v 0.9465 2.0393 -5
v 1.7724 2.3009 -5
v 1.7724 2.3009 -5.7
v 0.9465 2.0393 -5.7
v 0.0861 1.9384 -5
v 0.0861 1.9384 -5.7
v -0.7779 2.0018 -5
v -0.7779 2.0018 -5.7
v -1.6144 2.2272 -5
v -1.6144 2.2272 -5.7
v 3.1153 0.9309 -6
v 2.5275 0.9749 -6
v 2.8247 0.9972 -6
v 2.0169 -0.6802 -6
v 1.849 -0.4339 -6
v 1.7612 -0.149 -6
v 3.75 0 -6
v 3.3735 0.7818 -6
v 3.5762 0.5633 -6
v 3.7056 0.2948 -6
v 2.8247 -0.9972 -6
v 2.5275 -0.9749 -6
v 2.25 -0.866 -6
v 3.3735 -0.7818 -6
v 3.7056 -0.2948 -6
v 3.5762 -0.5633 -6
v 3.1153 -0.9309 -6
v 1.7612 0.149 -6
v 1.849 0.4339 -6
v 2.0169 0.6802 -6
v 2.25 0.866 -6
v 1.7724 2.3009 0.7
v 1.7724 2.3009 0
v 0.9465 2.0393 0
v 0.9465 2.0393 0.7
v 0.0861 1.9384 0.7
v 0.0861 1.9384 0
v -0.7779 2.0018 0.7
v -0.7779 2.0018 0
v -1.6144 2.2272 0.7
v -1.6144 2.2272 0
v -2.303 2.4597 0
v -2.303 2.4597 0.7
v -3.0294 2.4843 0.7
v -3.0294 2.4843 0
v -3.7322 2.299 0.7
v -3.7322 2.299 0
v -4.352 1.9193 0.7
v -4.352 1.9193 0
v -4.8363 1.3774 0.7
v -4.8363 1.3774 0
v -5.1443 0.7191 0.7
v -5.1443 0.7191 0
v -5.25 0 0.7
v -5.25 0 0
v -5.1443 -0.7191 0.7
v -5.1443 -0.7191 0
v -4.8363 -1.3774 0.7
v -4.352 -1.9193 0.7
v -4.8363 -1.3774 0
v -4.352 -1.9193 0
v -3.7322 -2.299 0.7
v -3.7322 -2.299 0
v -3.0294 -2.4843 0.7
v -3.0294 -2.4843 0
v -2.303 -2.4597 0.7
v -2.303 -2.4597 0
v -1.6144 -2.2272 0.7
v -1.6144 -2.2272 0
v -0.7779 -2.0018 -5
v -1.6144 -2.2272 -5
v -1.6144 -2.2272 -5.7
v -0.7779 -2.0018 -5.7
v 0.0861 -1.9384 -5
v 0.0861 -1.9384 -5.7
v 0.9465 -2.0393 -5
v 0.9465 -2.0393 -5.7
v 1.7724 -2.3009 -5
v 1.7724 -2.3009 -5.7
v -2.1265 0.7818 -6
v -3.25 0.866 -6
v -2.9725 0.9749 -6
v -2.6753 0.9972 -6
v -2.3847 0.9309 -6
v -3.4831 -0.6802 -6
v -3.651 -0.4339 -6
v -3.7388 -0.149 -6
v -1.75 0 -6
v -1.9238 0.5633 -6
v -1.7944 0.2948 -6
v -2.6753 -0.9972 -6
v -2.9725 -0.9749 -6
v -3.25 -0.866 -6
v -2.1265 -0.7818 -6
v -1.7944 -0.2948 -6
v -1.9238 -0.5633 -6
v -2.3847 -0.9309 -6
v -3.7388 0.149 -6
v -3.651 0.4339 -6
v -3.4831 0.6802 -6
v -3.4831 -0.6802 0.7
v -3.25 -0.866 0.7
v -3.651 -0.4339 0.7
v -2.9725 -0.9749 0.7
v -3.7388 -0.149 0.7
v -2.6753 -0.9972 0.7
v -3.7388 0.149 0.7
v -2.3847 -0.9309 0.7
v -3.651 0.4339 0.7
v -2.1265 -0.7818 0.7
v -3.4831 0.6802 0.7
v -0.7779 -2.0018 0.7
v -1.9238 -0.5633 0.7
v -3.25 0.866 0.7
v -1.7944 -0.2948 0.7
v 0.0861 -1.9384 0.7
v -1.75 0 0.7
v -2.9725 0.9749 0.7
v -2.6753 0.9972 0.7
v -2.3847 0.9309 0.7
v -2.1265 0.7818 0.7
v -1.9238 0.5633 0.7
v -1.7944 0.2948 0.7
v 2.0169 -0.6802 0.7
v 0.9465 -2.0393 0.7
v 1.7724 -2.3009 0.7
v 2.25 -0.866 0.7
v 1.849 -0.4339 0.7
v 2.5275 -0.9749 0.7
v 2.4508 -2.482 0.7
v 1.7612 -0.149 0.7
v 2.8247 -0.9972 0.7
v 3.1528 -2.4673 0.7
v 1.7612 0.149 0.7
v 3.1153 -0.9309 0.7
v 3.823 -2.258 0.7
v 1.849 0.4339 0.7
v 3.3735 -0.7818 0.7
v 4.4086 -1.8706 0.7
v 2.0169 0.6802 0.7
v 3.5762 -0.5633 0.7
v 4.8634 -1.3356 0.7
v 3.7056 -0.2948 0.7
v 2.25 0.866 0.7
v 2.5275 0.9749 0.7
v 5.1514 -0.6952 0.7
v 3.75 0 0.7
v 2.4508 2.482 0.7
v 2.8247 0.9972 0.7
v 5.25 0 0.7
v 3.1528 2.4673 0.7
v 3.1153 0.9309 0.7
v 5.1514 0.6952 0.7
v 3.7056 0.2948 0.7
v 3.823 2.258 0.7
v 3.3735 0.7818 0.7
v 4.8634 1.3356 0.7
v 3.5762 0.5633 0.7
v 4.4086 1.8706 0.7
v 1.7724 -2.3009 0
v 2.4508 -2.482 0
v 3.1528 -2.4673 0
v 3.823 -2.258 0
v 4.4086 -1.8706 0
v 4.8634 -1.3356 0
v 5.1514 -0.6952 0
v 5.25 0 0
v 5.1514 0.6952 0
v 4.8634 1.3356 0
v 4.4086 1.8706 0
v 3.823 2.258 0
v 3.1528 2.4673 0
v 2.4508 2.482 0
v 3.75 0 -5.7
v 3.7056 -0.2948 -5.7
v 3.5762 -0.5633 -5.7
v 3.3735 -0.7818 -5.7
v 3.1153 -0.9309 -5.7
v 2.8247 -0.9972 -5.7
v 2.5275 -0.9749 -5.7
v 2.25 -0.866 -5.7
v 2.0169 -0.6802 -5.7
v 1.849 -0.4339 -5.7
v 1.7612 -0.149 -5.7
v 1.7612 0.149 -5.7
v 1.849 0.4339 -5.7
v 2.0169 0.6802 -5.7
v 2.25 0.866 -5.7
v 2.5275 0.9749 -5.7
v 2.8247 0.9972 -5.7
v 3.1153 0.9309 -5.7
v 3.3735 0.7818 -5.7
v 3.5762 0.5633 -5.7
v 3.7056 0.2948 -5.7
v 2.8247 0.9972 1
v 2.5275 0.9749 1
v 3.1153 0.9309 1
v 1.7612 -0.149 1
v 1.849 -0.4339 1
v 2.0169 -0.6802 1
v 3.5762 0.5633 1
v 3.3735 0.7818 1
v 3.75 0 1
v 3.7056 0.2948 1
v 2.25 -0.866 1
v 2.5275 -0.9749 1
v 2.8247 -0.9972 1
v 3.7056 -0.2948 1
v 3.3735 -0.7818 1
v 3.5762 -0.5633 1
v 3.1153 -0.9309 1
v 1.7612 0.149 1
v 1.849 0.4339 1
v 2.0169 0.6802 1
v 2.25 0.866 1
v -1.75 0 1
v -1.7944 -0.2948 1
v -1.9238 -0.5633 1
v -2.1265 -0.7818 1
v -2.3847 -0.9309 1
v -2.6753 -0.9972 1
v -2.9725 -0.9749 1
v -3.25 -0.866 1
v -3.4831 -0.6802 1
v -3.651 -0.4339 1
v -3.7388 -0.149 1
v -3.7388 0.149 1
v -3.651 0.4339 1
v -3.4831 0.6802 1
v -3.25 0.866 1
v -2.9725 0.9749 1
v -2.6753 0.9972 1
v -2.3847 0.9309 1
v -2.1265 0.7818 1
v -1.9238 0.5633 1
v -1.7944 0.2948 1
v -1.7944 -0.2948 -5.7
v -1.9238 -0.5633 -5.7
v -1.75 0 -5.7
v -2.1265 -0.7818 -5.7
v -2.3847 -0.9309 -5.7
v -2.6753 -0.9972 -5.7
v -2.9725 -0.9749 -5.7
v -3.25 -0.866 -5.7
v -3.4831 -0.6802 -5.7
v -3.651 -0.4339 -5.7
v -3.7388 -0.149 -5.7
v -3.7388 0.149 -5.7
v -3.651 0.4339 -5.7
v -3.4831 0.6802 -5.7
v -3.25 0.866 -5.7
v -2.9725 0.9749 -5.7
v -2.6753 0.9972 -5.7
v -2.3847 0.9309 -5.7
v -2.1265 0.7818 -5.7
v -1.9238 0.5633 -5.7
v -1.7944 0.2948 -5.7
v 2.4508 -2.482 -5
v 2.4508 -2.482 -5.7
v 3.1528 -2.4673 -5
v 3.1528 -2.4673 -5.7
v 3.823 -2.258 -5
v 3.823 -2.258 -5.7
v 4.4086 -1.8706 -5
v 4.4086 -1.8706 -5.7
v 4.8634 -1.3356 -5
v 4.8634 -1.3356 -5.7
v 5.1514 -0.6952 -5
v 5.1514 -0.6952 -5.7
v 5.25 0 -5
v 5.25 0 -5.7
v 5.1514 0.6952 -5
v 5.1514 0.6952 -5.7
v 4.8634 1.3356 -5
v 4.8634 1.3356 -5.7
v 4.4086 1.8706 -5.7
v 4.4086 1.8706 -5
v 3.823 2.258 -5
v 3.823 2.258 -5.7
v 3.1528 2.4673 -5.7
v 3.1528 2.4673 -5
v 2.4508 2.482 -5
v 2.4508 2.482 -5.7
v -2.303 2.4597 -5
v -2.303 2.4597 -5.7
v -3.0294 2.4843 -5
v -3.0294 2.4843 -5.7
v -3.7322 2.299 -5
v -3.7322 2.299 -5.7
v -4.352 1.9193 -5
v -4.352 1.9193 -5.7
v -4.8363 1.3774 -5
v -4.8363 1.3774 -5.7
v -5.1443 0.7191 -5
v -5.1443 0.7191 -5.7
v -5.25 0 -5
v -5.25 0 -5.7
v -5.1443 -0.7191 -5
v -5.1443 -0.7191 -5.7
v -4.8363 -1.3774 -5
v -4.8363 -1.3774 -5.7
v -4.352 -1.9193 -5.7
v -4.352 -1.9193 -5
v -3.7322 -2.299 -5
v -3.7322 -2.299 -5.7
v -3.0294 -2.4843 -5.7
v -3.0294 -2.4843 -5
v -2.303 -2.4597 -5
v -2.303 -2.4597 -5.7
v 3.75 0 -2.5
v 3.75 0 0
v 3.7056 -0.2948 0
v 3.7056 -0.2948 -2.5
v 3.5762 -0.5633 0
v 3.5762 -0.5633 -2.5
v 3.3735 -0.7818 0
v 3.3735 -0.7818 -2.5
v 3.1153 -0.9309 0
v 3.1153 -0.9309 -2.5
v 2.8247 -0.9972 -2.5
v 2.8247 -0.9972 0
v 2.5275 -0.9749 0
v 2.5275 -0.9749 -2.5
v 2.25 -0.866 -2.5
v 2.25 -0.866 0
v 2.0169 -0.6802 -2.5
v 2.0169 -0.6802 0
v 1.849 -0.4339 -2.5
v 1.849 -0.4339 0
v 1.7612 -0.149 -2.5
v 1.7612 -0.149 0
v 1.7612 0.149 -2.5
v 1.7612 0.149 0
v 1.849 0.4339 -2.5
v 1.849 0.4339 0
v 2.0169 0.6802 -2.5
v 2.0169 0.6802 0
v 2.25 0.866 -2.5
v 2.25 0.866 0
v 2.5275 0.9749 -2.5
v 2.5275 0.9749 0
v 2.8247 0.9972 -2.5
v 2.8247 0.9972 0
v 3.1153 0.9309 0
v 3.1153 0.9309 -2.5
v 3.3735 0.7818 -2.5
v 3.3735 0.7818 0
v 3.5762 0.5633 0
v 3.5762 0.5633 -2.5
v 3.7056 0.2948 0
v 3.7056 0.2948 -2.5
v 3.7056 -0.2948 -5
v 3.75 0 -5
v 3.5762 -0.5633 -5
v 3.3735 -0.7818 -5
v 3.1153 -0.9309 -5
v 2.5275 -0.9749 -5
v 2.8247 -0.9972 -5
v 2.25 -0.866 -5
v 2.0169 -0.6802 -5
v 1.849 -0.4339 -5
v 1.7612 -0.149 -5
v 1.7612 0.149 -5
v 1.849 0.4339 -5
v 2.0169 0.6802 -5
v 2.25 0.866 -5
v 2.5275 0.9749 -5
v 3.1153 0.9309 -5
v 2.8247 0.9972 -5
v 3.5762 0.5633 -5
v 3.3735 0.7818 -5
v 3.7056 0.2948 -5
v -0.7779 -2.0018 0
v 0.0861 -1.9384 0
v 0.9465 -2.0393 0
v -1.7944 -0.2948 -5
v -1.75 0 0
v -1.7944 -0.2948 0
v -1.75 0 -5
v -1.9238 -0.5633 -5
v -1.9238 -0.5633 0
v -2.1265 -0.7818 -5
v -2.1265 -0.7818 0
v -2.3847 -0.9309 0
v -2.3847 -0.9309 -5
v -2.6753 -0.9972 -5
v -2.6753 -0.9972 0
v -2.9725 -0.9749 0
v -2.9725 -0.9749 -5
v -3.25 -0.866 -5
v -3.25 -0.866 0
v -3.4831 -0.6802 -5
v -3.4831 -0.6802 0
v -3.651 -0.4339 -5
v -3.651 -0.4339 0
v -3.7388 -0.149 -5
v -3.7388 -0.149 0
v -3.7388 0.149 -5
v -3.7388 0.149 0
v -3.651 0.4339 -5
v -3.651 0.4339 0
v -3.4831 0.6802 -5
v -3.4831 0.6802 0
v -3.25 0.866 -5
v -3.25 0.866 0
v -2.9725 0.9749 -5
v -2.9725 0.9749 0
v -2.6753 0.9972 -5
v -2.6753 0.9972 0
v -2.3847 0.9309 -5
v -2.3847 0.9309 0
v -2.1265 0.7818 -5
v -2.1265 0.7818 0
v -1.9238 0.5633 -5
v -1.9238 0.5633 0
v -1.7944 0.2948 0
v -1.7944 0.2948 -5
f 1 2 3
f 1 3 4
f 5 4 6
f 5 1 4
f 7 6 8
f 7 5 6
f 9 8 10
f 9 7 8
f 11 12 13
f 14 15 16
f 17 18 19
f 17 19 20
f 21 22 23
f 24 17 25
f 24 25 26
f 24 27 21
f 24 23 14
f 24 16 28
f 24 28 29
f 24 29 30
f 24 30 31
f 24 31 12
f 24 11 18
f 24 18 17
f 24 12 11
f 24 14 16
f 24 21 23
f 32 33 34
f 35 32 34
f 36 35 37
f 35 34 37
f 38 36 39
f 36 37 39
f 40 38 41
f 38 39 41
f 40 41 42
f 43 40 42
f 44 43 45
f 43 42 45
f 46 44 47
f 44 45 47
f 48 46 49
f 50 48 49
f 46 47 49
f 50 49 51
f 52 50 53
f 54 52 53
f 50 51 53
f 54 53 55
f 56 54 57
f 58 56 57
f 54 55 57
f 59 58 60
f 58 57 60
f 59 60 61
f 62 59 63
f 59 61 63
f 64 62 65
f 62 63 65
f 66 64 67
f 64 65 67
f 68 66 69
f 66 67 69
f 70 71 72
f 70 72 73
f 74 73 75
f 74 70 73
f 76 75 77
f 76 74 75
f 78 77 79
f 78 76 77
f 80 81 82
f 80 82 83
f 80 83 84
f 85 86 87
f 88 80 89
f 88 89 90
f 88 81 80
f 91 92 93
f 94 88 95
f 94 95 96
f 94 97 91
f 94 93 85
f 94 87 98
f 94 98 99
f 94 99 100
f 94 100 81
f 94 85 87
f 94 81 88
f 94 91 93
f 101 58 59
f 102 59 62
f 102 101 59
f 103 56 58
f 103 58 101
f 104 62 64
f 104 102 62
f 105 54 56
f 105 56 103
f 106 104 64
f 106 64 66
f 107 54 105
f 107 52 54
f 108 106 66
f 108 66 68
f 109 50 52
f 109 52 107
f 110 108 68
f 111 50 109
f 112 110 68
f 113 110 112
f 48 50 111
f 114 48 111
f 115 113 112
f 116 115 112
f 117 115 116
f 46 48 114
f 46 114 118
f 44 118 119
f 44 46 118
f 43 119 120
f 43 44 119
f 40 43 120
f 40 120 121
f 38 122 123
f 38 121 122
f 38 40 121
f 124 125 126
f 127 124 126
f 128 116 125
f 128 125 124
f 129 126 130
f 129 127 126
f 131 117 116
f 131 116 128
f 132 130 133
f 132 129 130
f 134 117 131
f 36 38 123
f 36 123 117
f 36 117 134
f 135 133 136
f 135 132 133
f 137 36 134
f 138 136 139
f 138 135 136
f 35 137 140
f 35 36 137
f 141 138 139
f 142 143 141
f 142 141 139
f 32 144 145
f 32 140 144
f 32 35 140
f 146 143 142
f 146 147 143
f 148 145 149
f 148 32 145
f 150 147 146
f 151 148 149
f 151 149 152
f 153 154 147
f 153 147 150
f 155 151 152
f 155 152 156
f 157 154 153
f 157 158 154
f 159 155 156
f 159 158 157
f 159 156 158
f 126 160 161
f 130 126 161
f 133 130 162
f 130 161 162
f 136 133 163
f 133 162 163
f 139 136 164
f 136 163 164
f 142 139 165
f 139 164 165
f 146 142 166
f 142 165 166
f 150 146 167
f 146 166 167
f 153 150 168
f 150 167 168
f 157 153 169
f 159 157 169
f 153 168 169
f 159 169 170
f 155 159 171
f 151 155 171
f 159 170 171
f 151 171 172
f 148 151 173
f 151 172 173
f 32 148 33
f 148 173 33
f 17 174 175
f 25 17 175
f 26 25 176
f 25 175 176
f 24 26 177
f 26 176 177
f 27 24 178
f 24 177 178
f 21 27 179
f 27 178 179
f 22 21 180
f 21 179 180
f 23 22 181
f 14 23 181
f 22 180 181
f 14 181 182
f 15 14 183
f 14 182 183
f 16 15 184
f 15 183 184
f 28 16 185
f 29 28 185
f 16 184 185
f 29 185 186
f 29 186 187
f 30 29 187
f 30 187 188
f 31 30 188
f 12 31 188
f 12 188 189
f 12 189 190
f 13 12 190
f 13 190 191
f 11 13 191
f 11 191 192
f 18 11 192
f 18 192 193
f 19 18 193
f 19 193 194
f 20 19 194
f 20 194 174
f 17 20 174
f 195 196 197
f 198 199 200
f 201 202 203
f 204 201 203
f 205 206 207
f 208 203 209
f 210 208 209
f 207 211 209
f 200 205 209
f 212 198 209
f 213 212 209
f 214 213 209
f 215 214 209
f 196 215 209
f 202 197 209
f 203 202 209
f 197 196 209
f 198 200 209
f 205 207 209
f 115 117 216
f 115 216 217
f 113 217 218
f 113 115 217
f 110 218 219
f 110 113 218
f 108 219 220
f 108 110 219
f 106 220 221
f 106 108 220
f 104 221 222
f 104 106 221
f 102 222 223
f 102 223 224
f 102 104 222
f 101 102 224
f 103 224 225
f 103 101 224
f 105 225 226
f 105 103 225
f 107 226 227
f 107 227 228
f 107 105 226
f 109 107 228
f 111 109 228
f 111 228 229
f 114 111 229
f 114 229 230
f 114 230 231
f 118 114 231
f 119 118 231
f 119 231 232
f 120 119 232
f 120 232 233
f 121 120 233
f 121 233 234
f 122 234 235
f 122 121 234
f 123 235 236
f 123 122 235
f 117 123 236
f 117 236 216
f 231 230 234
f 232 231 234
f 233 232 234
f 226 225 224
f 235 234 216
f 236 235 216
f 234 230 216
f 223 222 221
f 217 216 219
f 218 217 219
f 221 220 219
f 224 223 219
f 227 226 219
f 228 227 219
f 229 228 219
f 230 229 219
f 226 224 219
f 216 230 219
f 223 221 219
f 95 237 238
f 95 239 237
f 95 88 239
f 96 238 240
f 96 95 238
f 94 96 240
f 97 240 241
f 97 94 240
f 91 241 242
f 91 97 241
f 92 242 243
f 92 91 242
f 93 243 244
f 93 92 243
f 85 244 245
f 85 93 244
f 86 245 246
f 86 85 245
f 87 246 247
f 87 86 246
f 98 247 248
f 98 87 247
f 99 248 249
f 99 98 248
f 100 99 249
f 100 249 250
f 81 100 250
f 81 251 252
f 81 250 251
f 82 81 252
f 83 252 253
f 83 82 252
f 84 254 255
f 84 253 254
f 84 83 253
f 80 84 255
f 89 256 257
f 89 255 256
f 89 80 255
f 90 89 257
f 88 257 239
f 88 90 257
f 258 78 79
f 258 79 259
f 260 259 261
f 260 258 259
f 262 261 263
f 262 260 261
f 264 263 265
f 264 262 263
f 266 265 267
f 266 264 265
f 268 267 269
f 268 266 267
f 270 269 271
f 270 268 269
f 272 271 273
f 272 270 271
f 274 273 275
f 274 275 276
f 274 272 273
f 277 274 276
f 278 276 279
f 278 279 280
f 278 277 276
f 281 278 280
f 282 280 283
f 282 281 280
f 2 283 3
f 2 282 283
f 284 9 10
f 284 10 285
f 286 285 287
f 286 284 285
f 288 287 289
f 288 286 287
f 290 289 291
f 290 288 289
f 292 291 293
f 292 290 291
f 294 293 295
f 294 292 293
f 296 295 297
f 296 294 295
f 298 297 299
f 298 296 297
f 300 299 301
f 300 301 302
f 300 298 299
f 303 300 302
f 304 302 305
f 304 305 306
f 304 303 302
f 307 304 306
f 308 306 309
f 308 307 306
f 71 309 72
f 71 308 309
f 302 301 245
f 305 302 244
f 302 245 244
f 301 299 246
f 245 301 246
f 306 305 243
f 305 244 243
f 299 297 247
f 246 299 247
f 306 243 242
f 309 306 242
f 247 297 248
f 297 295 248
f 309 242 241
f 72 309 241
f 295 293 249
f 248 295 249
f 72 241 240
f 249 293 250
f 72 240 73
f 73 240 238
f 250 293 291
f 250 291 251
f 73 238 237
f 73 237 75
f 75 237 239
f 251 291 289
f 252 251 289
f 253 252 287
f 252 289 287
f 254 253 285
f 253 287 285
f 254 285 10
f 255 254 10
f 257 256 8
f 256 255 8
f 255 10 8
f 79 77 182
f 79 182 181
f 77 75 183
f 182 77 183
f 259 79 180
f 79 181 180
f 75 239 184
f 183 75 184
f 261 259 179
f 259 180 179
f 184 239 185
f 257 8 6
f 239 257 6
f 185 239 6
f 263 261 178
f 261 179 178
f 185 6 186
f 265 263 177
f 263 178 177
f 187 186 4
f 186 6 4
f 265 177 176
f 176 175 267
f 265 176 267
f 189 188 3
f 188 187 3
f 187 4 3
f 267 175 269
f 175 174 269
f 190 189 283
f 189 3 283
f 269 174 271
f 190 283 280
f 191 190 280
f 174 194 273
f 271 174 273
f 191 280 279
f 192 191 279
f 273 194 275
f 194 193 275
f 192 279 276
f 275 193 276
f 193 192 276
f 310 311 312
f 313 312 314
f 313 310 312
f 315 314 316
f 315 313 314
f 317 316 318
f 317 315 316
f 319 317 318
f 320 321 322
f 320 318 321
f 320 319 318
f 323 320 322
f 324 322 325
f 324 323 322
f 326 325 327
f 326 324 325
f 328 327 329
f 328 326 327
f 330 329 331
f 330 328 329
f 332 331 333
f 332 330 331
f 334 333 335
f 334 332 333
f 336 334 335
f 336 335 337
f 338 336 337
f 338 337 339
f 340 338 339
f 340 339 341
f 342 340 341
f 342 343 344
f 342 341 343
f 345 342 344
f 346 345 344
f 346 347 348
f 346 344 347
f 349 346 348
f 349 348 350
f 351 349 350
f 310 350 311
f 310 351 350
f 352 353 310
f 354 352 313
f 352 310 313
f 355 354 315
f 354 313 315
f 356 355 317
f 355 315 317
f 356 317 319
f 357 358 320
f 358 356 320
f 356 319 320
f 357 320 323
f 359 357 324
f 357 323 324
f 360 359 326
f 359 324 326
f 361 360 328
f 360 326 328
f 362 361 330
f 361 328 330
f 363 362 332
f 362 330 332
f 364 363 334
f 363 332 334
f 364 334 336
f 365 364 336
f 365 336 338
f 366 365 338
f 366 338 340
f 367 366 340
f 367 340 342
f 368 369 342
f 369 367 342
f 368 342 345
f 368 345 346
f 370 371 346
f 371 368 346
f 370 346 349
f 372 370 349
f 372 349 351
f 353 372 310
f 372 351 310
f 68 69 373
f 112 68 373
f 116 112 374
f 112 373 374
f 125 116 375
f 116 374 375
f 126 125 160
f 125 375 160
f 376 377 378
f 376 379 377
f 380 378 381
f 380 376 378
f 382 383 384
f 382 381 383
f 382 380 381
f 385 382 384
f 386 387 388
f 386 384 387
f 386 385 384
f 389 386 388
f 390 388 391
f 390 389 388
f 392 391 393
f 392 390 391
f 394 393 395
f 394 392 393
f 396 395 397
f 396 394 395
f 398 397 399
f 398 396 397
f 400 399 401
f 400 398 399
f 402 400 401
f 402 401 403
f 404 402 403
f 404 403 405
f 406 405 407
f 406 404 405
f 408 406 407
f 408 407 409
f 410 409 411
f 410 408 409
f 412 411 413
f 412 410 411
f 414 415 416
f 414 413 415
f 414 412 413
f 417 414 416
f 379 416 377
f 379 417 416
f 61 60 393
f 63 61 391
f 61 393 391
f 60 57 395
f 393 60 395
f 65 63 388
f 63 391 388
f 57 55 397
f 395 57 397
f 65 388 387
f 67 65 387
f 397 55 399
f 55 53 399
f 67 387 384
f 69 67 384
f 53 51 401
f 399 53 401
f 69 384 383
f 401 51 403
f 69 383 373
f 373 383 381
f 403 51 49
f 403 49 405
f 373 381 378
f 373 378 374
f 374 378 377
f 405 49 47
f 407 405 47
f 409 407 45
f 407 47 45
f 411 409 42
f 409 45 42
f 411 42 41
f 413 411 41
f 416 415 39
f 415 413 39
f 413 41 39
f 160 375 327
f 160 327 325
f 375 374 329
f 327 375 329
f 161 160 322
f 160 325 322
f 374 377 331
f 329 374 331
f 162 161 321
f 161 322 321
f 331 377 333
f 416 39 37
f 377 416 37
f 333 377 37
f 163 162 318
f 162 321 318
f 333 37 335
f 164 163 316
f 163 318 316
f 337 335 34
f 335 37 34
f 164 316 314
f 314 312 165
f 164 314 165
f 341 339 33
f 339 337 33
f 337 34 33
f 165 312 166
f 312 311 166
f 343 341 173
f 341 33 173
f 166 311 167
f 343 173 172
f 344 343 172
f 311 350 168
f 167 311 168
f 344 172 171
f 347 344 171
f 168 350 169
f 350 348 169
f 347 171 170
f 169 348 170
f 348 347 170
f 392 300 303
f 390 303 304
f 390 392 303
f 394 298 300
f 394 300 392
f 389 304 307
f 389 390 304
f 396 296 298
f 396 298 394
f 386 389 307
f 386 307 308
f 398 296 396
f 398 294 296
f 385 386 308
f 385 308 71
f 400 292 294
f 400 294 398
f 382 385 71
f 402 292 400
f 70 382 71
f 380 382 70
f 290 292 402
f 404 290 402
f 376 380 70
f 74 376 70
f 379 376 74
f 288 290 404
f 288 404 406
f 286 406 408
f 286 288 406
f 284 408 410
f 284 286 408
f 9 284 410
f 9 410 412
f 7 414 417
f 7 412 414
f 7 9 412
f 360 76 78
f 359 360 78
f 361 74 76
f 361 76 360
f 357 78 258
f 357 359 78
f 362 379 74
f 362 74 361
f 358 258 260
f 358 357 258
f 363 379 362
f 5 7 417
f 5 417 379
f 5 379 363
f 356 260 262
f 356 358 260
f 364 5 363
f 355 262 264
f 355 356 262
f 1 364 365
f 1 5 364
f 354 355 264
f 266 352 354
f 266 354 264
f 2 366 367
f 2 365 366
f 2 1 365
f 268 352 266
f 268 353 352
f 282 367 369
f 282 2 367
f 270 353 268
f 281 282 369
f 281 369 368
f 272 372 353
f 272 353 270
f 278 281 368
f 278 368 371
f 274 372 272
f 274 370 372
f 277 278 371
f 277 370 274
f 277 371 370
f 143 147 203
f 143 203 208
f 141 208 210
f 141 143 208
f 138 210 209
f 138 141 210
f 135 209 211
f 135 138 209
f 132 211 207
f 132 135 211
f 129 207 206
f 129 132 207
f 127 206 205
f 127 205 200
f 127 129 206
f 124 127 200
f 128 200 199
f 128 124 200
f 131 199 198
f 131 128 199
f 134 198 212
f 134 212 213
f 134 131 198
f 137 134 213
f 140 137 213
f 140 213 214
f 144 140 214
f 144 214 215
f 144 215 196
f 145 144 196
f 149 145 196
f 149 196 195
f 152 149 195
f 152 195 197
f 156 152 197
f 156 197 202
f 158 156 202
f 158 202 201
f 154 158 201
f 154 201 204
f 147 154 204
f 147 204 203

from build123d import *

# Parameters (mm, degrees)
SKETCH1_R           = 1
BOSS_EXTRUDE1_DEPTH = 0.7
SKETCH2_R           = 1
BOSS_EXTRUDE2_DEPTH = 3.5


with BuildPart() as part:
    # Sketch1 → Boss-Extrude1 (new body)
    with BuildSketch(Plane.XY):
        with BuildLine():
            ThreePointArc((-1.614432161, 2.227214781), (-5.25, 0), (-1.614432161, -2.227214781))
            ThreePointArc((-1.614432161, -2.227214781), (0.086080134, -1.938406924), (1.772413942, -2.300940134))
            ThreePointArc((1.772413942, -2.300940134), (5.25, 0), (1.772413942, 2.300940134))
            ThreePointArc((1.772413942, 2.300940134), (0.086080134, 1.938406924), (-1.614432161, 2.227214781))
        make_face()
        with Locations((-2.75, 0)):
            Circle(SKETCH1_R, mode=Mode.SUBTRACT)
        with Locations((2.75, 0)):
            Circle(SKETCH1_R, mode=Mode.SUBTRACT)
    extrude(amount=BOSS_EXTRUDE1_DEPTH)


with BuildPart() as body_2:
    # Mirror1: mirrored copy
    add(part.part.mirror(Plane(origin=(0, 0, -2.5), x_dir=(1, 0, 0), z_dir=(0, 0, -1))))


with BuildPart() as part_1:
    add(part.part)

    add(body_2.part)  # Boss-Extrude2 merges body 2
    # Sketch2 → Boss-Extrude2 (add, symmetric)
    with BuildSketch(Plane(origin=(0, 0, -2.5), x_dir=(-1, 0, 0), z_dir=(0, 0, -1))):
        with Locations(Location((-2.75, 0, 0), (0, 0, 180))):
            Circle(SKETCH2_R)
        with Locations(Location((2.75, 0, 0), (0, 0, 180))):
            Circle(SKETCH2_R)
    extrude(amount=BOSS_EXTRUDE2_DEPTH, both=True)


solid = part_1.part
